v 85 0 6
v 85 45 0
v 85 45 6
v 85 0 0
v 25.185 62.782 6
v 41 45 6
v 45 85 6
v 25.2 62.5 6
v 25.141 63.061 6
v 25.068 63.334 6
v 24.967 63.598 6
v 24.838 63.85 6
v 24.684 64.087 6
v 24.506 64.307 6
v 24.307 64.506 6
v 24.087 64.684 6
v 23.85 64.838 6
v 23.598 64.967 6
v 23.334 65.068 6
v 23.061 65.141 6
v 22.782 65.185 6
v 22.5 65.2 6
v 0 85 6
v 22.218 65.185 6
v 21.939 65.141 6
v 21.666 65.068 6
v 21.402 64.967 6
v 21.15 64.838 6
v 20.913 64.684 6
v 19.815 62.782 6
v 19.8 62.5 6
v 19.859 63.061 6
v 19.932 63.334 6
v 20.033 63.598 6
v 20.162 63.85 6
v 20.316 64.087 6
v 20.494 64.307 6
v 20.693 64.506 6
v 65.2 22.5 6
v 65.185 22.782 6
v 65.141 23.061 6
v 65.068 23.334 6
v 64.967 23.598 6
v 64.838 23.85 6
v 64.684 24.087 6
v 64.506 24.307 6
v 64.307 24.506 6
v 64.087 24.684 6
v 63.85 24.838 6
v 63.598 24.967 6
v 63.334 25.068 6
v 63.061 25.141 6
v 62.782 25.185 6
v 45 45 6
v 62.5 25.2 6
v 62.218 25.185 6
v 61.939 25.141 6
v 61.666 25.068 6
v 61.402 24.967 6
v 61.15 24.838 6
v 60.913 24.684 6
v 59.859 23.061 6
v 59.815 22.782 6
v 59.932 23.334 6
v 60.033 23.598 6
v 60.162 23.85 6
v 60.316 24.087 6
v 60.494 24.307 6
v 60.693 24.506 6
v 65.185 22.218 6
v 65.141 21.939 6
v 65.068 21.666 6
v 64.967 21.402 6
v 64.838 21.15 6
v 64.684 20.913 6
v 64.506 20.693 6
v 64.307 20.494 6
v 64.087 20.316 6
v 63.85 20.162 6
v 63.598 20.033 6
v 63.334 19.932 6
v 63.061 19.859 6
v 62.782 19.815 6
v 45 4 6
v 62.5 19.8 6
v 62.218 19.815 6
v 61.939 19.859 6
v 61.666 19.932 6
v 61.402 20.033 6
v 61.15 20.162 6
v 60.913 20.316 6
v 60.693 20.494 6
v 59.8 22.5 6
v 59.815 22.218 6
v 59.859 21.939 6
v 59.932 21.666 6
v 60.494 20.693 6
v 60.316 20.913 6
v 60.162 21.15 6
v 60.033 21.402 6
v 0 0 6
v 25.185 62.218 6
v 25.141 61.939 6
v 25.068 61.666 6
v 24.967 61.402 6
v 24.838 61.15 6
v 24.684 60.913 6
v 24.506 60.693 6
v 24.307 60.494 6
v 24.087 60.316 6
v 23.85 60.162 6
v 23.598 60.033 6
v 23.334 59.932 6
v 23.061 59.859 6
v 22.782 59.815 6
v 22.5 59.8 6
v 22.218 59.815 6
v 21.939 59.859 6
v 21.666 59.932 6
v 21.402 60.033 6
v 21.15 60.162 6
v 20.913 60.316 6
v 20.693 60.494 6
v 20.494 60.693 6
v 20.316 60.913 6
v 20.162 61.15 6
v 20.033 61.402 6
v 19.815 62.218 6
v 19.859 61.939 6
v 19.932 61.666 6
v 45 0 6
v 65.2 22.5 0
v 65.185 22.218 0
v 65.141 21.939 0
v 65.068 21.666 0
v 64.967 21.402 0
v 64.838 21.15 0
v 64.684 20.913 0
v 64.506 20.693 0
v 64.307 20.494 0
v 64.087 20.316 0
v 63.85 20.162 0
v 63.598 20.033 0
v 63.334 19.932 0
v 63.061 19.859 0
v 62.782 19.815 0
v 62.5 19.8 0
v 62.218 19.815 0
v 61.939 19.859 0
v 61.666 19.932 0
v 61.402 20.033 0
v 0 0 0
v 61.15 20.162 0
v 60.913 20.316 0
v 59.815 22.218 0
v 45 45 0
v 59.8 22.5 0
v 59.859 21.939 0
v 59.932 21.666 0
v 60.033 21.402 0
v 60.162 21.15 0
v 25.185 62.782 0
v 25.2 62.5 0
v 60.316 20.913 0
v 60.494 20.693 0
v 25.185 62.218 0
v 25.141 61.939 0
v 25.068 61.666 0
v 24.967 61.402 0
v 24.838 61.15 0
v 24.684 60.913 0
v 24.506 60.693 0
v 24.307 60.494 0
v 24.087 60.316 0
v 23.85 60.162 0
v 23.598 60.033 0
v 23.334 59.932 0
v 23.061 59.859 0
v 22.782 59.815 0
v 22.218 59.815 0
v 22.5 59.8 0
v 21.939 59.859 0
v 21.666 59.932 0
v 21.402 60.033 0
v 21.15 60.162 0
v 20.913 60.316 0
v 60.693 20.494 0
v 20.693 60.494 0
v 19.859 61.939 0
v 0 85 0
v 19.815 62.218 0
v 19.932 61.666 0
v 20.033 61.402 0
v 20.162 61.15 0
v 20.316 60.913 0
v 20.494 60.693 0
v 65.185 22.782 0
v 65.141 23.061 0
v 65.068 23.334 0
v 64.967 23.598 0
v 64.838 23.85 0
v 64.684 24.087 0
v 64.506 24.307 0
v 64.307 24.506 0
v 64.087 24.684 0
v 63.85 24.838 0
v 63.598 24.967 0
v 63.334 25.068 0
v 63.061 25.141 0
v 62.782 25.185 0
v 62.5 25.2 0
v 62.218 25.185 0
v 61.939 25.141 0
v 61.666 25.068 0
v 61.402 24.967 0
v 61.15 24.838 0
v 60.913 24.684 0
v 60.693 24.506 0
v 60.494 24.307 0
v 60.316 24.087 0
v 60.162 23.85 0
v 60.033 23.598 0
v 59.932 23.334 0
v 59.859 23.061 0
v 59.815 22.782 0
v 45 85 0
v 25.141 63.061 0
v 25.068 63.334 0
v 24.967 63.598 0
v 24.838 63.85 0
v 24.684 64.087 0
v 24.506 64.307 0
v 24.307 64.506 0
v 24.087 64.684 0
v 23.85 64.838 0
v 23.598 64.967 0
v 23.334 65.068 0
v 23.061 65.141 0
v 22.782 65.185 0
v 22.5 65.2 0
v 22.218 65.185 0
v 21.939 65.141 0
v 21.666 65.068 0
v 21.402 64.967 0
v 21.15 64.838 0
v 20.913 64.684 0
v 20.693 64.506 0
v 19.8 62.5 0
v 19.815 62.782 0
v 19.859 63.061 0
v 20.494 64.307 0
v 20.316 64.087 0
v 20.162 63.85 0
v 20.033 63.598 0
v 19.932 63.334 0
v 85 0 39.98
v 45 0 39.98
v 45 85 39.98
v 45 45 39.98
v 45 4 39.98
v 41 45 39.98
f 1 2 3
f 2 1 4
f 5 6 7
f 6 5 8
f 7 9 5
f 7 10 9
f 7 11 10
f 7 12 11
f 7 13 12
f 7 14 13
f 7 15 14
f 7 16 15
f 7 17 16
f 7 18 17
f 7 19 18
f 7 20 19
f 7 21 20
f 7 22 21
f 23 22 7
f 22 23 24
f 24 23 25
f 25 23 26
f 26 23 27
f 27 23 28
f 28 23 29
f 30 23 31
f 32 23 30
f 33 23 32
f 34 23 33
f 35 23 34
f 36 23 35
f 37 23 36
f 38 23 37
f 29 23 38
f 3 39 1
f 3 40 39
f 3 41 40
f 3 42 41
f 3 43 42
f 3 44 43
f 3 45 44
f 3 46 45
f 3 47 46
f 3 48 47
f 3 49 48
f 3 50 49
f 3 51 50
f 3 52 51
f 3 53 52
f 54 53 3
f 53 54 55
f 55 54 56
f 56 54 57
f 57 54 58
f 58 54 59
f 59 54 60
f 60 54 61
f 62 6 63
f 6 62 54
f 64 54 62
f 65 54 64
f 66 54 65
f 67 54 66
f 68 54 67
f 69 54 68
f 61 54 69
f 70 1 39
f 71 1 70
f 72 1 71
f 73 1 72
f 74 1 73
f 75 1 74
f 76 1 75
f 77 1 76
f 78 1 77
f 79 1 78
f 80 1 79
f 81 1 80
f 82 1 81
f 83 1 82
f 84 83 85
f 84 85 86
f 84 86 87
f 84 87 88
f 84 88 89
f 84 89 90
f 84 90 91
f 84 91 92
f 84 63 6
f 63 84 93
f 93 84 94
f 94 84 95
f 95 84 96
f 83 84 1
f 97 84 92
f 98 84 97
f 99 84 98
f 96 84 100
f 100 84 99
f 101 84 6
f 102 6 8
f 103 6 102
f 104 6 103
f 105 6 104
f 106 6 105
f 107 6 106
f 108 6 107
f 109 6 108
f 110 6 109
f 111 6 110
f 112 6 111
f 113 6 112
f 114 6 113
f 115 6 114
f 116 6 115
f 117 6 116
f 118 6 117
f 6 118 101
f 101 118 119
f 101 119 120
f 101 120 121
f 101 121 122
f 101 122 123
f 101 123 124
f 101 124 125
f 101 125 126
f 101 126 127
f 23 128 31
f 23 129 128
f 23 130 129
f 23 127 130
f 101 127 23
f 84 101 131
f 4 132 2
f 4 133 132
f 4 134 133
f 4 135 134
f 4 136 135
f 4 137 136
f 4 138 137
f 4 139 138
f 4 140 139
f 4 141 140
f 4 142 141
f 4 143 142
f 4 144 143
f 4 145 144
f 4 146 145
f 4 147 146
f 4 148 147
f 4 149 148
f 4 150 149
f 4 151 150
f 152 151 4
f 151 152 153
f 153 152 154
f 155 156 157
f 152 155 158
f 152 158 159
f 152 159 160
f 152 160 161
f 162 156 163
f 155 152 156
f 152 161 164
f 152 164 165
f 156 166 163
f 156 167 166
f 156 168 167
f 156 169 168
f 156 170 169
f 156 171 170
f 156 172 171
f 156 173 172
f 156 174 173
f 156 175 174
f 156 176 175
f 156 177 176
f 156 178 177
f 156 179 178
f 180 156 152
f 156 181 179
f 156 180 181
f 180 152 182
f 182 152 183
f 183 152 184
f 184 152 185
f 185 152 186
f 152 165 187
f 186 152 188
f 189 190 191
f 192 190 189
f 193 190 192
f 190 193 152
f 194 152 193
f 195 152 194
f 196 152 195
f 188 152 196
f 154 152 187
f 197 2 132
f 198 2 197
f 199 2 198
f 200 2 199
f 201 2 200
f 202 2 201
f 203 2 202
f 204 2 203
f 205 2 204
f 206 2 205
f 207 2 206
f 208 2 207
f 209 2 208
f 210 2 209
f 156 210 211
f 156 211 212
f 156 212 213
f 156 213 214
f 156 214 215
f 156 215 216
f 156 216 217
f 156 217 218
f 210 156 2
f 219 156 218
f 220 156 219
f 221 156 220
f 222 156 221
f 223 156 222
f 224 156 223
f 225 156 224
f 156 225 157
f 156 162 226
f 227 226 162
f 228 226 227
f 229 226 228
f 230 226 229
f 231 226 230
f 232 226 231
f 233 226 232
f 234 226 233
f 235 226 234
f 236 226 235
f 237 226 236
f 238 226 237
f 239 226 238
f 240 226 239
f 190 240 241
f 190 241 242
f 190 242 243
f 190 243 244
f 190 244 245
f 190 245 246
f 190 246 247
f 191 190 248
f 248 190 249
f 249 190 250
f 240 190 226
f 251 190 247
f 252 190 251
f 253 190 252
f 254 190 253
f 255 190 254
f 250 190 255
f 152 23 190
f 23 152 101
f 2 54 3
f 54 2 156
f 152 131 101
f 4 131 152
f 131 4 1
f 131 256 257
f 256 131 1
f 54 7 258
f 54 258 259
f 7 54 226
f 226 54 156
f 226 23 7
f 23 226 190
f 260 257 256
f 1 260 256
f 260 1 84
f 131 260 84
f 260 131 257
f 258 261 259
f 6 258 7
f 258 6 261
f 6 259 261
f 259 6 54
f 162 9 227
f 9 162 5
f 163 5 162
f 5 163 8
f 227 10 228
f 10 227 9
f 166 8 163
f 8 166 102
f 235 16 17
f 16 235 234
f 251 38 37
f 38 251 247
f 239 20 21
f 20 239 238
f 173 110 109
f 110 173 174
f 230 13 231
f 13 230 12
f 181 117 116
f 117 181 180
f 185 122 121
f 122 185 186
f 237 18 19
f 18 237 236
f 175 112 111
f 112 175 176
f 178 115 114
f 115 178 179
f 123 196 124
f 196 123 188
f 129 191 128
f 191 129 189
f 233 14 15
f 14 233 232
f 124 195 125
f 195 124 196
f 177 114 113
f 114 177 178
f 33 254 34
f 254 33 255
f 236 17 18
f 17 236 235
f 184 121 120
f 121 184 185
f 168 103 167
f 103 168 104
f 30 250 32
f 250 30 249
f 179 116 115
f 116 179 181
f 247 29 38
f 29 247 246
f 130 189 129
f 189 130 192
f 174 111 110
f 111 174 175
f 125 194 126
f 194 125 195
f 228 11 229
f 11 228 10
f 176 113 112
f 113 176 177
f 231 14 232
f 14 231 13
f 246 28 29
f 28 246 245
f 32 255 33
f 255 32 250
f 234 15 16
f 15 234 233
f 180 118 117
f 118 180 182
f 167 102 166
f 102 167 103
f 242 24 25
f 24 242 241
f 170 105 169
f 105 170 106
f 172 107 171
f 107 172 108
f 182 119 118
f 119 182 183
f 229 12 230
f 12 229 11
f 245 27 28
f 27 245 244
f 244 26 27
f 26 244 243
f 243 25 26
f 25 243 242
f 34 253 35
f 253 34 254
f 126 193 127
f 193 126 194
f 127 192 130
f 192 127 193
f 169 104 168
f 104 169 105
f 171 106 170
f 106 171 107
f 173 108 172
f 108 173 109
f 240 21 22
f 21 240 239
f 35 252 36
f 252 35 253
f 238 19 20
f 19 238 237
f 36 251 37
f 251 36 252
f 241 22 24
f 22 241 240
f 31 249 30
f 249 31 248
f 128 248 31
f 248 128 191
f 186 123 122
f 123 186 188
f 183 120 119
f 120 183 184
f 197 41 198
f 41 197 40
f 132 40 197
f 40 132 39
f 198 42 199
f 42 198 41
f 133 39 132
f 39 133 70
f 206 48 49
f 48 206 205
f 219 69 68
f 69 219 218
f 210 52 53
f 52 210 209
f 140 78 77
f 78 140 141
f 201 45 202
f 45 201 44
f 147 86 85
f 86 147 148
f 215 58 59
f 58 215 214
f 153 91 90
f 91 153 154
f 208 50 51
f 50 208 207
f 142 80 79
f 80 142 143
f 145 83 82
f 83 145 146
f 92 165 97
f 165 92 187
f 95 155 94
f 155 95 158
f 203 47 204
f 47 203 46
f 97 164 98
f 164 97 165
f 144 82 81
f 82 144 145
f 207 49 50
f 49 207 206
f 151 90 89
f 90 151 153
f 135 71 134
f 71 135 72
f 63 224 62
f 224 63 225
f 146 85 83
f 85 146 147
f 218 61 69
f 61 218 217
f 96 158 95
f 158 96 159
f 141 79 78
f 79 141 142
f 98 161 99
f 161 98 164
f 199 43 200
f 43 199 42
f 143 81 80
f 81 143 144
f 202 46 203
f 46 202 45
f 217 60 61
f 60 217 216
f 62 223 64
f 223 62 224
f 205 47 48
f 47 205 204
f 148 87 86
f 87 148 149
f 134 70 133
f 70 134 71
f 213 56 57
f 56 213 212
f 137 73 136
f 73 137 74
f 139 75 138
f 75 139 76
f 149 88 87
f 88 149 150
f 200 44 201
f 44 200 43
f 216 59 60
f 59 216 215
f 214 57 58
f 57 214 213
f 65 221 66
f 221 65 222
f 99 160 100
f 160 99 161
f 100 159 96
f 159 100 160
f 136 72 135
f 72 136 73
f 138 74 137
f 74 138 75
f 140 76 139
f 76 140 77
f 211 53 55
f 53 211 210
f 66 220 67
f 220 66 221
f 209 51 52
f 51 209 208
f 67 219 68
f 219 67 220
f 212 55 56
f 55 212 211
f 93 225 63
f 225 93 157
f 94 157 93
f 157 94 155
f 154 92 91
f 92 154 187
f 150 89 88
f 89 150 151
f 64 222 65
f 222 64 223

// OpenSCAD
// Reinforced right-angle gusset for 45 mm profile.
$fn = 60;
eps = 0.02;
profile = 45;
arm = 85;
plate_t = 6;
rib_t = 4;
rib_h = 34;
module rib_x() {
    translate([profile, 0, plate_t - eps]) linear_extrude(height = rib_h)
        polygon(points = [[0, 0], [arm - profile, 0], [0, rib_t]]);
}
module rib_y() {
    translate([profile, profile, plate_t - eps]) rotate([0, 0, 90]) linear_extrude(height = rib_h)
        polygon(points = [[0, 0], [arm - profile, 0], [0, rib_t]]);
}
difference() {
    union() { cube([arm, profile, plate_t]); cube([profile, arm, plate_t]); rib_x(); rib_y(); }
    for (p = [[profile / 2, arm - profile / 2], [arm - profile / 2, profile / 2]])
        translate([p[0], p[1], -eps]) cylinder(d = 5.4, h = plate_t + 2 * eps);
}
